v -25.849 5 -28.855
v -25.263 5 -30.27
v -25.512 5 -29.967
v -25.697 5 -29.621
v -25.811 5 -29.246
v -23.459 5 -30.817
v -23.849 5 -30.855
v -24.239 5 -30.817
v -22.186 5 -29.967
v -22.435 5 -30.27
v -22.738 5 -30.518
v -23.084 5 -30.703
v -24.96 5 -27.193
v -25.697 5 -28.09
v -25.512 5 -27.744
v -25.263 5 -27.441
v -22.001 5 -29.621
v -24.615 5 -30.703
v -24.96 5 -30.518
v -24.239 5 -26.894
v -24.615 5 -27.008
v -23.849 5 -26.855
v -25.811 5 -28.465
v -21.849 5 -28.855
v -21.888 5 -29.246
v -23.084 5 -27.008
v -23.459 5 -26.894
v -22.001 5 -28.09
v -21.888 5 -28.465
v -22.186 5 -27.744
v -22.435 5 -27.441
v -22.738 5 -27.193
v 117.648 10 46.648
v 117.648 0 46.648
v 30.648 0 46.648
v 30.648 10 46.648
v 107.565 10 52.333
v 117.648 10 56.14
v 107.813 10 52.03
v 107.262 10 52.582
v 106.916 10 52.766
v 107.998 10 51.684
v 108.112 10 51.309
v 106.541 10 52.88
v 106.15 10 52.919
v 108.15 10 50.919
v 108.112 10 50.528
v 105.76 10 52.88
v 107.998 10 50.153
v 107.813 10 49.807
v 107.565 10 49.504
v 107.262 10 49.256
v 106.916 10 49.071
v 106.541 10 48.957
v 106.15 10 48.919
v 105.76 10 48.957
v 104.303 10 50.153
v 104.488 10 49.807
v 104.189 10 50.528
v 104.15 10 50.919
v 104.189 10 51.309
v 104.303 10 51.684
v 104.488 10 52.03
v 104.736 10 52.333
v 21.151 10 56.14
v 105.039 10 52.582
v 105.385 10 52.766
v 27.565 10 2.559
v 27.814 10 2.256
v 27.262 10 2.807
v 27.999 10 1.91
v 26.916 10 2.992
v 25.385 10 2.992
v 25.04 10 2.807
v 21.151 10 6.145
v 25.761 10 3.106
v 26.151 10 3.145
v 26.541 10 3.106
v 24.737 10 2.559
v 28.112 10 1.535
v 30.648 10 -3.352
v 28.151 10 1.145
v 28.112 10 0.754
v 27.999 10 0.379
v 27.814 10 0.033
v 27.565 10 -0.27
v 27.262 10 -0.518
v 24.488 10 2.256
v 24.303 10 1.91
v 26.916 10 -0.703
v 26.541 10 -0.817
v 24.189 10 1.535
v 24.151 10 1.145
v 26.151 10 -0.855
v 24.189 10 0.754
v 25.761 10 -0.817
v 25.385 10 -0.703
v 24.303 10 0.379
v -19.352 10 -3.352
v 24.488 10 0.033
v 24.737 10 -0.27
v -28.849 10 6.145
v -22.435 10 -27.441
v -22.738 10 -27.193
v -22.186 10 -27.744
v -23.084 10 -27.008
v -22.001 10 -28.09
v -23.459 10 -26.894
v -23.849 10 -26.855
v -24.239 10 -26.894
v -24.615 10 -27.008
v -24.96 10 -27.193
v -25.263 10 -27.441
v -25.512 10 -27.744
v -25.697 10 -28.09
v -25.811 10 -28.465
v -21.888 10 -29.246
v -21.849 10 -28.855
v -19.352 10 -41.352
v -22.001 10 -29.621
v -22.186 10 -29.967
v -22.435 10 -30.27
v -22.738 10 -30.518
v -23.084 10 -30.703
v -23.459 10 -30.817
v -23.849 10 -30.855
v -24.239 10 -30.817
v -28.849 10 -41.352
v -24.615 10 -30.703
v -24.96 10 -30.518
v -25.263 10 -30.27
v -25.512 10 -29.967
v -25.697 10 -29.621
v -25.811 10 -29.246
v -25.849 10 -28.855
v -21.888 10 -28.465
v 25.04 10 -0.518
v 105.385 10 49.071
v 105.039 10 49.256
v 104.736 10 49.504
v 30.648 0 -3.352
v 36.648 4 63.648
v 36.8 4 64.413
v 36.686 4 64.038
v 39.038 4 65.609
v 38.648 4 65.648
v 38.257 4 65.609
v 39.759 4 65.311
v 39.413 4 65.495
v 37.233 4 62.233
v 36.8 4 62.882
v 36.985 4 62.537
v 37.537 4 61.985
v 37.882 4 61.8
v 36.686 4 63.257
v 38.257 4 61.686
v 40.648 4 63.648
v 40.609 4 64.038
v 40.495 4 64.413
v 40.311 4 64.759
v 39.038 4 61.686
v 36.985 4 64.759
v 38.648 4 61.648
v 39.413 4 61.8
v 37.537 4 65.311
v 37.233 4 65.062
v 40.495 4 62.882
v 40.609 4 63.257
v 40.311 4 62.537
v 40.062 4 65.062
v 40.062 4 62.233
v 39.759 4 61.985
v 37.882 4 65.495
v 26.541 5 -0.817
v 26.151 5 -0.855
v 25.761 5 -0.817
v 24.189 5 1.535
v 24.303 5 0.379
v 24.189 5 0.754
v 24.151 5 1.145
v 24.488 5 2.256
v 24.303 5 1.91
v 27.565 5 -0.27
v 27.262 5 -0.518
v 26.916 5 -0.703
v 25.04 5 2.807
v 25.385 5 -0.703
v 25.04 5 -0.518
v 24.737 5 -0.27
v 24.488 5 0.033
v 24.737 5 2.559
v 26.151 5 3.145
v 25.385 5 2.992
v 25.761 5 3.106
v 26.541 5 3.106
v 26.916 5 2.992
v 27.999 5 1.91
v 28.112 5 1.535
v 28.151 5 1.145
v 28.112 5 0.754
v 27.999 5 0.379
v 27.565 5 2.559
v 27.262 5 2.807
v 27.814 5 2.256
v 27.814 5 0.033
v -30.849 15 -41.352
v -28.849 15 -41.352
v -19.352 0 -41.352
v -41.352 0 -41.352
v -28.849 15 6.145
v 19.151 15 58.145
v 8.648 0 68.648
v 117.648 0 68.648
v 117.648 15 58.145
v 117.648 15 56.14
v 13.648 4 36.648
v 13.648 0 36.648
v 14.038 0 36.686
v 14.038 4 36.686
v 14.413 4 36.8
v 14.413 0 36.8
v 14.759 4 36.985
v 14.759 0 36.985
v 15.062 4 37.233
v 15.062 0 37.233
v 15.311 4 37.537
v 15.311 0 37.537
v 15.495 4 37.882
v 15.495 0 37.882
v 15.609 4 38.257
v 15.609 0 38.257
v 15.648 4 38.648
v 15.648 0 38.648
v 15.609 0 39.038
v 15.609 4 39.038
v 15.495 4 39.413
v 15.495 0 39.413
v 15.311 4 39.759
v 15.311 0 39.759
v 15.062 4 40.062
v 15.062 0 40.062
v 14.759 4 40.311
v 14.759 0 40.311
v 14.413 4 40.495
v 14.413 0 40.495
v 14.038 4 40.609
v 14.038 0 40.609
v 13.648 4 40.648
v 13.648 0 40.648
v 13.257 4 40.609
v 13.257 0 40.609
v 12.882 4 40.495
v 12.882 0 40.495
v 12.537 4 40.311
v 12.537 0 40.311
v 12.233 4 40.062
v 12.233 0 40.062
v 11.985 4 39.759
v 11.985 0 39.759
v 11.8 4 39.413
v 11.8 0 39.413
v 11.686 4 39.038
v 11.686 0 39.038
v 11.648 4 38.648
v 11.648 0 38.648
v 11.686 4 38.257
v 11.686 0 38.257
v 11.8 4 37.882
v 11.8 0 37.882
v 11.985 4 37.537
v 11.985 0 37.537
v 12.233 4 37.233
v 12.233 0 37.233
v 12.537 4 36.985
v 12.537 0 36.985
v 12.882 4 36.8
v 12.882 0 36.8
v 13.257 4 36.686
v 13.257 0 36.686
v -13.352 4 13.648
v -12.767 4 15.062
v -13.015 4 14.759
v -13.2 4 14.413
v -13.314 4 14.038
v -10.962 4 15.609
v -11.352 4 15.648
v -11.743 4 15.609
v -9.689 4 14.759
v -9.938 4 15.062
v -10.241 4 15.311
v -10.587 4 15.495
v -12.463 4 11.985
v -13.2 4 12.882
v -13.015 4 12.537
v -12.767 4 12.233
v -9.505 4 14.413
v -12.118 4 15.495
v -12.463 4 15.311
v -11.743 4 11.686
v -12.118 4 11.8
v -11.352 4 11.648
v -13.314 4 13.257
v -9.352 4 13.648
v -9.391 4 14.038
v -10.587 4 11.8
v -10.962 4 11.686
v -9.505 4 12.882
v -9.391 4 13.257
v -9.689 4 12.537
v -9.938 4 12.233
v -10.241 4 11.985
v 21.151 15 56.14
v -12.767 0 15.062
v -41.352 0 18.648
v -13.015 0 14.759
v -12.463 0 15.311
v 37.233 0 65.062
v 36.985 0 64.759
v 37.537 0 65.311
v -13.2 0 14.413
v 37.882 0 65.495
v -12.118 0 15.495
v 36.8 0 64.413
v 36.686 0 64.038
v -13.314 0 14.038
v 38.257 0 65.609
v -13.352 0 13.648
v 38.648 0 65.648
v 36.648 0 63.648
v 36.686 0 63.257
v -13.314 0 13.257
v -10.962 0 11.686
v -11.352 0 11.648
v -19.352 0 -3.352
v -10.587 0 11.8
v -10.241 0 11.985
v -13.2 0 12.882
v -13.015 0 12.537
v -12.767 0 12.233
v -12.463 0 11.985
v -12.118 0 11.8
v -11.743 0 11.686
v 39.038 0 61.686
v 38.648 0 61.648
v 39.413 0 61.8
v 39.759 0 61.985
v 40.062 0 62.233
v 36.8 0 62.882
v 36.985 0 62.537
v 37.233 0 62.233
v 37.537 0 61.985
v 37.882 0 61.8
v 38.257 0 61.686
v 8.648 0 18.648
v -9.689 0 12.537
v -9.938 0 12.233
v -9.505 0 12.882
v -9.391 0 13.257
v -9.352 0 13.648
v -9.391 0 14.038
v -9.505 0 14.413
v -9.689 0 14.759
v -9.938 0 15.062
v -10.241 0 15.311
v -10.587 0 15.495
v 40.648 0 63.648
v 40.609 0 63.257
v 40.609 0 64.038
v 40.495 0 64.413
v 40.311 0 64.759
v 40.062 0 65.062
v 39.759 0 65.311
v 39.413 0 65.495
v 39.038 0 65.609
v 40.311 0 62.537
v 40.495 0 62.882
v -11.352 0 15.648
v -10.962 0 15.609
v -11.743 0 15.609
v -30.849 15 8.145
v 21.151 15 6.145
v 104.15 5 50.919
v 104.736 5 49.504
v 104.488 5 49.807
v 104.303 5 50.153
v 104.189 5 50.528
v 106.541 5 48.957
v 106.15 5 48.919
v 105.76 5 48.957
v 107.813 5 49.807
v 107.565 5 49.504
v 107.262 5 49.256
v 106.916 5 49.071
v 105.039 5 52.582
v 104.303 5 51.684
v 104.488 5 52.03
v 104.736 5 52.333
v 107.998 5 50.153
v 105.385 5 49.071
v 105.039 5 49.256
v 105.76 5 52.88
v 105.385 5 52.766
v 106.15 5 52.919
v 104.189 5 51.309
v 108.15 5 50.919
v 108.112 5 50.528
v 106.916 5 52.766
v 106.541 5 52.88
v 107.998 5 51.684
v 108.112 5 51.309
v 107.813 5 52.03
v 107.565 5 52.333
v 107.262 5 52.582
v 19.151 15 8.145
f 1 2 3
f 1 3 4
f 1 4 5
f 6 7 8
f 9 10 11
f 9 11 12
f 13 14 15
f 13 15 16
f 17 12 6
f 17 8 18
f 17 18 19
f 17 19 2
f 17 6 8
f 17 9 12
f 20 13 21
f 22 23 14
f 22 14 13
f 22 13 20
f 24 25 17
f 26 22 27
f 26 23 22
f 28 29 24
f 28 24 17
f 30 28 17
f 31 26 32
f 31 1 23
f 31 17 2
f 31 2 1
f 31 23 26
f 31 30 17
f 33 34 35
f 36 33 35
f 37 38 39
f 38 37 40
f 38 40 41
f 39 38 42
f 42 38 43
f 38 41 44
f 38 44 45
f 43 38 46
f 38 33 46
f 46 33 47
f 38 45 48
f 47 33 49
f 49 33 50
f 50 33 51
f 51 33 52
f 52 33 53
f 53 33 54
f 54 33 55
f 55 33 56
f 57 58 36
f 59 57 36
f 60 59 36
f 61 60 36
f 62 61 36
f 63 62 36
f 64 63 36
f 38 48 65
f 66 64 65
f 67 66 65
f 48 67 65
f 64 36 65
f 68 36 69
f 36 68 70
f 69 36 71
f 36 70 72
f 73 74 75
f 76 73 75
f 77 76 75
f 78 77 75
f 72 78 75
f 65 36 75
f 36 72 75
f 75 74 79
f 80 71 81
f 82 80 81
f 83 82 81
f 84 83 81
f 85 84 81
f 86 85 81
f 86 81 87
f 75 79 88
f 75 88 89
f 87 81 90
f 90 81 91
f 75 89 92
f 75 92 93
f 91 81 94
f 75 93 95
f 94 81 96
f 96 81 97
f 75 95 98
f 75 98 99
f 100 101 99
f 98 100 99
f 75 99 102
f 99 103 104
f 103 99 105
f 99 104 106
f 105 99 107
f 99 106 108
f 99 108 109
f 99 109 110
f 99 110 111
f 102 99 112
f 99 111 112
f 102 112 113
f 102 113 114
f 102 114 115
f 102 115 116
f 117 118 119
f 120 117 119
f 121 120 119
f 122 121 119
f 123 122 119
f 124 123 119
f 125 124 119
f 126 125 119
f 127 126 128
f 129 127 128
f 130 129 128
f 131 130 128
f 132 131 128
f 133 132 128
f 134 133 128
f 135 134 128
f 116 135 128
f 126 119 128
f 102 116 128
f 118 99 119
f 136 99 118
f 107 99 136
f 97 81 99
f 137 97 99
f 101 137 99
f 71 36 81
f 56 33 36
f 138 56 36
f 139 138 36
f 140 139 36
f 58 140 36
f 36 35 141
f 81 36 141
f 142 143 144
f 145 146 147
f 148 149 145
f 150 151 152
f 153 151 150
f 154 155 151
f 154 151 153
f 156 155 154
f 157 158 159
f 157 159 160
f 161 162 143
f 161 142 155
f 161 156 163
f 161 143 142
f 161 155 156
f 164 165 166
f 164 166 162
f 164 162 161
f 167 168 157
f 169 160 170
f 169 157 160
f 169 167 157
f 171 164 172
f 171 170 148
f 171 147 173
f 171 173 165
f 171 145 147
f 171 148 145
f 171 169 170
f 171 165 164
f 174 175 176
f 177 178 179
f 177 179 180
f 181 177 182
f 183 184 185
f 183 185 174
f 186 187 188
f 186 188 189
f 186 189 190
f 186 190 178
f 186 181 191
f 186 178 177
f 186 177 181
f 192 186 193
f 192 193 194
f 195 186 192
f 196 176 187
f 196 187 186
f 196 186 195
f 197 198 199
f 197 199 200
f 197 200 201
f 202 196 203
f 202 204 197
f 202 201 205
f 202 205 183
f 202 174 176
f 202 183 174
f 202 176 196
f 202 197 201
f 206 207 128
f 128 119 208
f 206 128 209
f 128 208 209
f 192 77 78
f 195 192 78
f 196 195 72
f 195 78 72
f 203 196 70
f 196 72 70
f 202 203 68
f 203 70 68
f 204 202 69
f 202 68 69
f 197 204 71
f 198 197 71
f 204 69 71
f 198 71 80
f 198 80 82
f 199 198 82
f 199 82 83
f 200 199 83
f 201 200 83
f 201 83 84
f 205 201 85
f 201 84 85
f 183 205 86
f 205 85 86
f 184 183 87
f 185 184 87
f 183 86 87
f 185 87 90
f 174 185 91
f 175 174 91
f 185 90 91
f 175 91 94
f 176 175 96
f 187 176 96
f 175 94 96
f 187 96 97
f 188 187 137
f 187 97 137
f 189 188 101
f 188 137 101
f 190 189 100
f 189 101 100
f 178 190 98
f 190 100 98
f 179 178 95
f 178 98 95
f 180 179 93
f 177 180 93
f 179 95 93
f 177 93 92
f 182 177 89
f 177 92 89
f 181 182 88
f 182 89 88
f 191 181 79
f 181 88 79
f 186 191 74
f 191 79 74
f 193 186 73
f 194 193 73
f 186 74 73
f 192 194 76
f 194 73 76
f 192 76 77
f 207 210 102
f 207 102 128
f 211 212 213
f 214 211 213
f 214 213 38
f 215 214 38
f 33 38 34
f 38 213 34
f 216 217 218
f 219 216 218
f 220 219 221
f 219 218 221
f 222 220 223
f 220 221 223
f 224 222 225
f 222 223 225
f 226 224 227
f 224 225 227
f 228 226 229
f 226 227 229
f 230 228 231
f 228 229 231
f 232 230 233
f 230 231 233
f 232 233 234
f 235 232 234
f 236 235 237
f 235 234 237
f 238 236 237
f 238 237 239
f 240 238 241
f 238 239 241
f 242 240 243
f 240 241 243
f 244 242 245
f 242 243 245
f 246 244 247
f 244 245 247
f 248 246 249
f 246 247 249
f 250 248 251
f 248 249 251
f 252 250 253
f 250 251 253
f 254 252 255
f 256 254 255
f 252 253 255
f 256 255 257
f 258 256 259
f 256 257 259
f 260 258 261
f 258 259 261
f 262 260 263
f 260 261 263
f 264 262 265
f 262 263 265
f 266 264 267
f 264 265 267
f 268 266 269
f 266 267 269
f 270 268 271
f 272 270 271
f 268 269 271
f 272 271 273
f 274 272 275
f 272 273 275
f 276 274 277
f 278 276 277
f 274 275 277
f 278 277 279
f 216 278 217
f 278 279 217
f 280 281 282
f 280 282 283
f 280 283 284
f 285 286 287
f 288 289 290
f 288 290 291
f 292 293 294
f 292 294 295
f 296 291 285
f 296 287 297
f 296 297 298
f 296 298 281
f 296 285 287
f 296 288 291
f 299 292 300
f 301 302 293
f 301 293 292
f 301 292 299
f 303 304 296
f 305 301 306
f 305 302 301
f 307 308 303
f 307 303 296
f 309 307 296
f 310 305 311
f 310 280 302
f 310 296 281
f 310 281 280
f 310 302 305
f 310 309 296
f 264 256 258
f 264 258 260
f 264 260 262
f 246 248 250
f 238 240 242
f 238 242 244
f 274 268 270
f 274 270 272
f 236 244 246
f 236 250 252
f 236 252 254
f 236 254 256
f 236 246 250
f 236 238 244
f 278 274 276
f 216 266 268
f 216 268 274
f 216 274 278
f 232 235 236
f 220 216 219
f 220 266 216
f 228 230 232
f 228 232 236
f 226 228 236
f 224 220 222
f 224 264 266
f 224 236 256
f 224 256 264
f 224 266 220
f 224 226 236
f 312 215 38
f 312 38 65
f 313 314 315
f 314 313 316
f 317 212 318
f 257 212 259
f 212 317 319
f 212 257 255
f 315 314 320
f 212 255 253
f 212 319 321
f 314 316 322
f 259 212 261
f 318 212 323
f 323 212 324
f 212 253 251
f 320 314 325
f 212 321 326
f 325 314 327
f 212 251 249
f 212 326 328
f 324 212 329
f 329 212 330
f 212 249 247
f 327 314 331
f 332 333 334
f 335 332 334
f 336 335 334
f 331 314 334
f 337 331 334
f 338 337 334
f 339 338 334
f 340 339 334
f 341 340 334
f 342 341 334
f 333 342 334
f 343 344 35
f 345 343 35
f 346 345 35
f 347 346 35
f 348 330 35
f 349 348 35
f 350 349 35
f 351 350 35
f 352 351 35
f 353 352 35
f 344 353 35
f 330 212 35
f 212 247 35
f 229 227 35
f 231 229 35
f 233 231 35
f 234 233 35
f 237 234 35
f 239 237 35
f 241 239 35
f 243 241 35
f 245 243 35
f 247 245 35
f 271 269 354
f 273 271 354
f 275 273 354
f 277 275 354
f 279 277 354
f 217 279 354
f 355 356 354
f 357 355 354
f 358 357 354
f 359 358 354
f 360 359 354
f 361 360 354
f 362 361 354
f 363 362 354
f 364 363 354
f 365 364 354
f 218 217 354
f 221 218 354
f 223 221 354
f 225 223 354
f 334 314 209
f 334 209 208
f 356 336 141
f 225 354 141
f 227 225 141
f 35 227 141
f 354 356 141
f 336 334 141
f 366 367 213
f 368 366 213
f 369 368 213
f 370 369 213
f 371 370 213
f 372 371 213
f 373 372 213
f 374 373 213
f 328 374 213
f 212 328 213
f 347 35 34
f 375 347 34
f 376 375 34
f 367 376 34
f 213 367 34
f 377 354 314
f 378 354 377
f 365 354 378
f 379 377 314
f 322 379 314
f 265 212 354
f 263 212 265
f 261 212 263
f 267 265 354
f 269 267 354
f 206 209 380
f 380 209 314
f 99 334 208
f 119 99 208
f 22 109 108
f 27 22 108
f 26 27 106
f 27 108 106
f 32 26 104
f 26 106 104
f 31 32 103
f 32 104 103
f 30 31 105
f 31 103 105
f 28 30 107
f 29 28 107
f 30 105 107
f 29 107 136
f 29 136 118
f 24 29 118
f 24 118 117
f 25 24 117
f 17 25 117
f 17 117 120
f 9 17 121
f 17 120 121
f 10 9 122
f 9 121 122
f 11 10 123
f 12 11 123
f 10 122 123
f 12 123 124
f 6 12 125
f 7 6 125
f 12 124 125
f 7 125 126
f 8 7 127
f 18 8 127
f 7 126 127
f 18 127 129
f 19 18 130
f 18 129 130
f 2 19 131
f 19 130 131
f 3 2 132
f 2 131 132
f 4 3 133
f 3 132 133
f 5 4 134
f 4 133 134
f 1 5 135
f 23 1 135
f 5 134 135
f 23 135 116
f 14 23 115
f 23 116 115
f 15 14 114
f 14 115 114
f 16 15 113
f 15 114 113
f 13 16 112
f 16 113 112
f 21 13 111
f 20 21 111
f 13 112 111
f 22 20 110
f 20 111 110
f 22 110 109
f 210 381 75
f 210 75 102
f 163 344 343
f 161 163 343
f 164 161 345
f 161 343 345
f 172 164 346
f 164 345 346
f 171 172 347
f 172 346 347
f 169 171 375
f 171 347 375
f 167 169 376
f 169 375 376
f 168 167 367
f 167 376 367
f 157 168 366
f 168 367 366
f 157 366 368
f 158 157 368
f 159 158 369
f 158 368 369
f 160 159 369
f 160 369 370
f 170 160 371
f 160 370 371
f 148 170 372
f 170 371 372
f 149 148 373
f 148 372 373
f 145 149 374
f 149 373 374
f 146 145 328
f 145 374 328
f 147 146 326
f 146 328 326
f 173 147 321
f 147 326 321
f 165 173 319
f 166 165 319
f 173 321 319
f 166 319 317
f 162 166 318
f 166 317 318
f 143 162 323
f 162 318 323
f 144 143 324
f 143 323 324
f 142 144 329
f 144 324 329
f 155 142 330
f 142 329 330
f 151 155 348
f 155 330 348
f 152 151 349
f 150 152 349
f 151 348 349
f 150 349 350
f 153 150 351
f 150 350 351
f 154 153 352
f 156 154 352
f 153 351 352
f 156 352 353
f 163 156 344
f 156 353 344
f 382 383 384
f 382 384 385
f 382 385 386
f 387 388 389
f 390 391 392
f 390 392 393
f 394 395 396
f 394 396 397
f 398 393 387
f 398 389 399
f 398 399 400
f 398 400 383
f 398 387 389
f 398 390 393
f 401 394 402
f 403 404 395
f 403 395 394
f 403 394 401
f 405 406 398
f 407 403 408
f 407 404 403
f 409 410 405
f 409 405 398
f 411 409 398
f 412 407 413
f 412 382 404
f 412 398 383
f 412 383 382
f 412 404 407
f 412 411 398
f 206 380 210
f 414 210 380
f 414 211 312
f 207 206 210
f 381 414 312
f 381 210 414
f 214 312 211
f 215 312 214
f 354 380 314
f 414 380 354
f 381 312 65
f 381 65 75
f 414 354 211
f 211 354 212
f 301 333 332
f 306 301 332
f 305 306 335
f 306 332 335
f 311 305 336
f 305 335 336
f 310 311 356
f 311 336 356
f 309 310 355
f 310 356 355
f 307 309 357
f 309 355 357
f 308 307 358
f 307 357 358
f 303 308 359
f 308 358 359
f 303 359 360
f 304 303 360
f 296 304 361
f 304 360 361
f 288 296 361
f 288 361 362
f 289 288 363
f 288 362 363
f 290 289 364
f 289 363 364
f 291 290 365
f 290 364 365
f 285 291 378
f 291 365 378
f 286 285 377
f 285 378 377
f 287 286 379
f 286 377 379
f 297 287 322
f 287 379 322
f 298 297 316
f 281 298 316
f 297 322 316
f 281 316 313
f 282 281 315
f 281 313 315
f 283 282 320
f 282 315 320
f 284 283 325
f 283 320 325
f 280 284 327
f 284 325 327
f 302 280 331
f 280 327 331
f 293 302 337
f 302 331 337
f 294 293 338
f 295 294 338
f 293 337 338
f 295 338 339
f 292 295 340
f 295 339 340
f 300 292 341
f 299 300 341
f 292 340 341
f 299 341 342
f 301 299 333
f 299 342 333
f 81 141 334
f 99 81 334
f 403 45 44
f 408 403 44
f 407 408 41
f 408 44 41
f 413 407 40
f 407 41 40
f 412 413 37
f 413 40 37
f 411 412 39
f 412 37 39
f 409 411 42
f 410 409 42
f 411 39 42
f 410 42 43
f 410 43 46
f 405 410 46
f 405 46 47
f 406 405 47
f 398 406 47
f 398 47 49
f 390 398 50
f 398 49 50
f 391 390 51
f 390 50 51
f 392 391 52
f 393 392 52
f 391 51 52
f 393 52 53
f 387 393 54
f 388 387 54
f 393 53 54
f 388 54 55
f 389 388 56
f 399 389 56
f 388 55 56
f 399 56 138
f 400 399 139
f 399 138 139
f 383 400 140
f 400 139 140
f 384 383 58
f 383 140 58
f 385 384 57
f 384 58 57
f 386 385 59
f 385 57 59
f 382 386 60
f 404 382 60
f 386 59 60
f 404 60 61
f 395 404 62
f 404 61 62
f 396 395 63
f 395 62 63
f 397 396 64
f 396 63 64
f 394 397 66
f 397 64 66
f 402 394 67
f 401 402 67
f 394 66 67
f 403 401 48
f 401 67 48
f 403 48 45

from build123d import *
from OCP.BRepFilletAPI import BRepFilletAPI_MakeChamfer

# Parameters (mm, degrees)
BOSS_EXTRU_1_DEPTH      = 15
CHANFREIN1_SIZE         = 10.503113073
CHANFREIN1_SIZE_2       = 15
ESQUISSE4_R             = 2
ENL_V_MAT_EXTRU_3_DEPTH = 4
ENL_V_MAT_EXTRU_5_DEPTH = 5
ESQUISSE6_R             = 2
ENL_V_MAT_EXTRU_6_DEPTH = 5


with BuildPart() as part:
    # Esquisse1 → Boss.-Extru.1 (new body)
    with BuildSketch(Plane(origin=(0, 0, 0), x_dir=(1, 0, 0), z_dir=(0, 1, 0))):
        Polygon((-41.352348911, -18.647651089), (8.647651089, -18.647651089), (8.647651089, -68.647651089), (68.647651089, -68.647651089), (117.647651089, -68.647651089), (117.647651089, -46.647651089), (68.647651089, -46.647651089), (30.647651089, -46.647651089), (30.647651089, 3.352348911), (-19.352348911, 3.352348911), (-19.352348911, 41.352348911), (-41.352348911, 41.352348911), align=None)
    extrude(amount=BOSS_EXTRU_1_DEPTH)

    # Chanfrein1
    chanfrein1_edges_1 = [part.edges().sort_by_distance(p)[0] for p in [
        (63.147651089, 15, 68.647651089),
    ]]
    chanfrein1_side_1 = [part.faces().sort_by_distance(p)[0] for p in [
        (63.147651089, 15, 68.437588827),
    ]]
    chanfrein1_edges_2 = [part.edges().sort_by_distance(p)[0] for p in [
        (8.647651089, 15, 43.647651089),
    ]]
    chanfrein1_side_2 = [part.faces().sort_by_distance(p)[0] for p in [
        (8.85771335, 15, 43.647651089),
    ]]
    chanfrein1_edges_3 = [part.edges().sort_by_distance(p)[0] for p in [
        (-16.352348911, 15, 18.647651089),
    ]]
    chanfrein1_side_3 = [part.faces().sort_by_distance(p)[0] for p in [
        (-16.352348911, 14.789937739, 18.647651089),
    ]]
    chanfrein1_edges_4 = [part.edges().sort_by_distance(p)[0] for p in [
        (-41.352348911, 15, -11.352348911),
    ]]
    chanfrein1_side_4 = [part.faces().sort_by_distance(p)[0] for p in [
        (-41.14228665, 15, -11.352348911),
    ]]
    chanfrein1 = BRepFilletAPI_MakeChamfer(part.part.solid().wrapped)
    for e in chanfrein1_edges_1:
        chanfrein1.Add(CHANFREIN1_SIZE - 0.0001, CHANFREIN1_SIZE_2 - 0.0001, e.wrapped, chanfrein1_side_1[0].wrapped)
    for e in chanfrein1_edges_2:
        chanfrein1.Add(CHANFREIN1_SIZE - 0.0001, CHANFREIN1_SIZE_2 - 0.0001, e.wrapped, chanfrein1_side_2[0].wrapped)
    for e in chanfrein1_edges_3:
        chanfrein1.Add(CHANFREIN1_SIZE_2 - 0.0001, CHANFREIN1_SIZE - 0.0001, e.wrapped, chanfrein1_side_3[0].wrapped)
    for e in chanfrein1_edges_4:
        chanfrein1.Add(CHANFREIN1_SIZE - 0.0001, CHANFREIN1_SIZE_2 - 0.0001, e.wrapped, chanfrein1_side_4[0].wrapped)
    add(Compound.cast(chanfrein1.Shape()), mode=Mode.REPLACE)  # a hair under: the kernel refuses the full size

    # Esquisse4 → Enlèv. mat.-Extru.3 (cut)
    with BuildSketch(Plane.XZ):
        with Locations(Location((38.647651089, 63.647651089, 0), (0, 0, 270))):
            Circle(ESQUISSE4_R)
        with Locations(Location((13.647651089, 38.647651089, 0), (0, 0, 270))):
            Circle(ESQUISSE4_R)
        with Locations(Location((-11.352348911, 13.647651089, 0), (0, 0, 270))):
            Circle(ESQUISSE4_R)
    extrude(amount=-ENL_V_MAT_EXTRU_3_DEPTH, mode=Mode.SUBTRACT)

    # Esquisse5 → Enlèv. mat.-Extru.5 (cut)
    with BuildSketch(Plane(origin=(0, 15, 0), x_dir=(1, 0, 0), z_dir=(0, 1, 0))):
        Polygon((-28.849235838, 41.352348911), (-19.352348911, 41.352348911), (-19.352348911, 3.352348911), (30.647651089, 3.352348911), (30.647651089, -46.647651089), (117.647651089, -46.647651089), (117.647651089, -56.140382231), (21.150764162, -56.140382231), (21.150764162, -6.144538016), (-28.849235838, -6.144538016), align=None)
    extrude(amount=-ENL_V_MAT_EXTRU_5_DEPTH, mode=Mode.SUBTRACT)

    # Esquisse6 → Enlèv. mat.-Extru.6 (cut)
    with BuildSketch(Plane(origin=(0, 10, 0), x_dir=(1, 0, 0), z_dir=(0, 1, 0))):
        with Locations(Location((-23.849235838, 28.855461984, 0), (0, 0, 270))):
            Circle(ESQUISSE6_R)
        with Locations(Location((26.150764162, -1.144538016, 0), (0, 0, 270))):
            Circle(ESQUISSE6_R)
        with Locations(Location((106.150456792, -50.918618661, 0), (0, 0, 270))):
            Circle(ESQUISSE6_R)
    extrude(amount=-ENL_V_MAT_EXTRU_6_DEPTH, mode=Mode.SUBTRACT)


solid = part.part
